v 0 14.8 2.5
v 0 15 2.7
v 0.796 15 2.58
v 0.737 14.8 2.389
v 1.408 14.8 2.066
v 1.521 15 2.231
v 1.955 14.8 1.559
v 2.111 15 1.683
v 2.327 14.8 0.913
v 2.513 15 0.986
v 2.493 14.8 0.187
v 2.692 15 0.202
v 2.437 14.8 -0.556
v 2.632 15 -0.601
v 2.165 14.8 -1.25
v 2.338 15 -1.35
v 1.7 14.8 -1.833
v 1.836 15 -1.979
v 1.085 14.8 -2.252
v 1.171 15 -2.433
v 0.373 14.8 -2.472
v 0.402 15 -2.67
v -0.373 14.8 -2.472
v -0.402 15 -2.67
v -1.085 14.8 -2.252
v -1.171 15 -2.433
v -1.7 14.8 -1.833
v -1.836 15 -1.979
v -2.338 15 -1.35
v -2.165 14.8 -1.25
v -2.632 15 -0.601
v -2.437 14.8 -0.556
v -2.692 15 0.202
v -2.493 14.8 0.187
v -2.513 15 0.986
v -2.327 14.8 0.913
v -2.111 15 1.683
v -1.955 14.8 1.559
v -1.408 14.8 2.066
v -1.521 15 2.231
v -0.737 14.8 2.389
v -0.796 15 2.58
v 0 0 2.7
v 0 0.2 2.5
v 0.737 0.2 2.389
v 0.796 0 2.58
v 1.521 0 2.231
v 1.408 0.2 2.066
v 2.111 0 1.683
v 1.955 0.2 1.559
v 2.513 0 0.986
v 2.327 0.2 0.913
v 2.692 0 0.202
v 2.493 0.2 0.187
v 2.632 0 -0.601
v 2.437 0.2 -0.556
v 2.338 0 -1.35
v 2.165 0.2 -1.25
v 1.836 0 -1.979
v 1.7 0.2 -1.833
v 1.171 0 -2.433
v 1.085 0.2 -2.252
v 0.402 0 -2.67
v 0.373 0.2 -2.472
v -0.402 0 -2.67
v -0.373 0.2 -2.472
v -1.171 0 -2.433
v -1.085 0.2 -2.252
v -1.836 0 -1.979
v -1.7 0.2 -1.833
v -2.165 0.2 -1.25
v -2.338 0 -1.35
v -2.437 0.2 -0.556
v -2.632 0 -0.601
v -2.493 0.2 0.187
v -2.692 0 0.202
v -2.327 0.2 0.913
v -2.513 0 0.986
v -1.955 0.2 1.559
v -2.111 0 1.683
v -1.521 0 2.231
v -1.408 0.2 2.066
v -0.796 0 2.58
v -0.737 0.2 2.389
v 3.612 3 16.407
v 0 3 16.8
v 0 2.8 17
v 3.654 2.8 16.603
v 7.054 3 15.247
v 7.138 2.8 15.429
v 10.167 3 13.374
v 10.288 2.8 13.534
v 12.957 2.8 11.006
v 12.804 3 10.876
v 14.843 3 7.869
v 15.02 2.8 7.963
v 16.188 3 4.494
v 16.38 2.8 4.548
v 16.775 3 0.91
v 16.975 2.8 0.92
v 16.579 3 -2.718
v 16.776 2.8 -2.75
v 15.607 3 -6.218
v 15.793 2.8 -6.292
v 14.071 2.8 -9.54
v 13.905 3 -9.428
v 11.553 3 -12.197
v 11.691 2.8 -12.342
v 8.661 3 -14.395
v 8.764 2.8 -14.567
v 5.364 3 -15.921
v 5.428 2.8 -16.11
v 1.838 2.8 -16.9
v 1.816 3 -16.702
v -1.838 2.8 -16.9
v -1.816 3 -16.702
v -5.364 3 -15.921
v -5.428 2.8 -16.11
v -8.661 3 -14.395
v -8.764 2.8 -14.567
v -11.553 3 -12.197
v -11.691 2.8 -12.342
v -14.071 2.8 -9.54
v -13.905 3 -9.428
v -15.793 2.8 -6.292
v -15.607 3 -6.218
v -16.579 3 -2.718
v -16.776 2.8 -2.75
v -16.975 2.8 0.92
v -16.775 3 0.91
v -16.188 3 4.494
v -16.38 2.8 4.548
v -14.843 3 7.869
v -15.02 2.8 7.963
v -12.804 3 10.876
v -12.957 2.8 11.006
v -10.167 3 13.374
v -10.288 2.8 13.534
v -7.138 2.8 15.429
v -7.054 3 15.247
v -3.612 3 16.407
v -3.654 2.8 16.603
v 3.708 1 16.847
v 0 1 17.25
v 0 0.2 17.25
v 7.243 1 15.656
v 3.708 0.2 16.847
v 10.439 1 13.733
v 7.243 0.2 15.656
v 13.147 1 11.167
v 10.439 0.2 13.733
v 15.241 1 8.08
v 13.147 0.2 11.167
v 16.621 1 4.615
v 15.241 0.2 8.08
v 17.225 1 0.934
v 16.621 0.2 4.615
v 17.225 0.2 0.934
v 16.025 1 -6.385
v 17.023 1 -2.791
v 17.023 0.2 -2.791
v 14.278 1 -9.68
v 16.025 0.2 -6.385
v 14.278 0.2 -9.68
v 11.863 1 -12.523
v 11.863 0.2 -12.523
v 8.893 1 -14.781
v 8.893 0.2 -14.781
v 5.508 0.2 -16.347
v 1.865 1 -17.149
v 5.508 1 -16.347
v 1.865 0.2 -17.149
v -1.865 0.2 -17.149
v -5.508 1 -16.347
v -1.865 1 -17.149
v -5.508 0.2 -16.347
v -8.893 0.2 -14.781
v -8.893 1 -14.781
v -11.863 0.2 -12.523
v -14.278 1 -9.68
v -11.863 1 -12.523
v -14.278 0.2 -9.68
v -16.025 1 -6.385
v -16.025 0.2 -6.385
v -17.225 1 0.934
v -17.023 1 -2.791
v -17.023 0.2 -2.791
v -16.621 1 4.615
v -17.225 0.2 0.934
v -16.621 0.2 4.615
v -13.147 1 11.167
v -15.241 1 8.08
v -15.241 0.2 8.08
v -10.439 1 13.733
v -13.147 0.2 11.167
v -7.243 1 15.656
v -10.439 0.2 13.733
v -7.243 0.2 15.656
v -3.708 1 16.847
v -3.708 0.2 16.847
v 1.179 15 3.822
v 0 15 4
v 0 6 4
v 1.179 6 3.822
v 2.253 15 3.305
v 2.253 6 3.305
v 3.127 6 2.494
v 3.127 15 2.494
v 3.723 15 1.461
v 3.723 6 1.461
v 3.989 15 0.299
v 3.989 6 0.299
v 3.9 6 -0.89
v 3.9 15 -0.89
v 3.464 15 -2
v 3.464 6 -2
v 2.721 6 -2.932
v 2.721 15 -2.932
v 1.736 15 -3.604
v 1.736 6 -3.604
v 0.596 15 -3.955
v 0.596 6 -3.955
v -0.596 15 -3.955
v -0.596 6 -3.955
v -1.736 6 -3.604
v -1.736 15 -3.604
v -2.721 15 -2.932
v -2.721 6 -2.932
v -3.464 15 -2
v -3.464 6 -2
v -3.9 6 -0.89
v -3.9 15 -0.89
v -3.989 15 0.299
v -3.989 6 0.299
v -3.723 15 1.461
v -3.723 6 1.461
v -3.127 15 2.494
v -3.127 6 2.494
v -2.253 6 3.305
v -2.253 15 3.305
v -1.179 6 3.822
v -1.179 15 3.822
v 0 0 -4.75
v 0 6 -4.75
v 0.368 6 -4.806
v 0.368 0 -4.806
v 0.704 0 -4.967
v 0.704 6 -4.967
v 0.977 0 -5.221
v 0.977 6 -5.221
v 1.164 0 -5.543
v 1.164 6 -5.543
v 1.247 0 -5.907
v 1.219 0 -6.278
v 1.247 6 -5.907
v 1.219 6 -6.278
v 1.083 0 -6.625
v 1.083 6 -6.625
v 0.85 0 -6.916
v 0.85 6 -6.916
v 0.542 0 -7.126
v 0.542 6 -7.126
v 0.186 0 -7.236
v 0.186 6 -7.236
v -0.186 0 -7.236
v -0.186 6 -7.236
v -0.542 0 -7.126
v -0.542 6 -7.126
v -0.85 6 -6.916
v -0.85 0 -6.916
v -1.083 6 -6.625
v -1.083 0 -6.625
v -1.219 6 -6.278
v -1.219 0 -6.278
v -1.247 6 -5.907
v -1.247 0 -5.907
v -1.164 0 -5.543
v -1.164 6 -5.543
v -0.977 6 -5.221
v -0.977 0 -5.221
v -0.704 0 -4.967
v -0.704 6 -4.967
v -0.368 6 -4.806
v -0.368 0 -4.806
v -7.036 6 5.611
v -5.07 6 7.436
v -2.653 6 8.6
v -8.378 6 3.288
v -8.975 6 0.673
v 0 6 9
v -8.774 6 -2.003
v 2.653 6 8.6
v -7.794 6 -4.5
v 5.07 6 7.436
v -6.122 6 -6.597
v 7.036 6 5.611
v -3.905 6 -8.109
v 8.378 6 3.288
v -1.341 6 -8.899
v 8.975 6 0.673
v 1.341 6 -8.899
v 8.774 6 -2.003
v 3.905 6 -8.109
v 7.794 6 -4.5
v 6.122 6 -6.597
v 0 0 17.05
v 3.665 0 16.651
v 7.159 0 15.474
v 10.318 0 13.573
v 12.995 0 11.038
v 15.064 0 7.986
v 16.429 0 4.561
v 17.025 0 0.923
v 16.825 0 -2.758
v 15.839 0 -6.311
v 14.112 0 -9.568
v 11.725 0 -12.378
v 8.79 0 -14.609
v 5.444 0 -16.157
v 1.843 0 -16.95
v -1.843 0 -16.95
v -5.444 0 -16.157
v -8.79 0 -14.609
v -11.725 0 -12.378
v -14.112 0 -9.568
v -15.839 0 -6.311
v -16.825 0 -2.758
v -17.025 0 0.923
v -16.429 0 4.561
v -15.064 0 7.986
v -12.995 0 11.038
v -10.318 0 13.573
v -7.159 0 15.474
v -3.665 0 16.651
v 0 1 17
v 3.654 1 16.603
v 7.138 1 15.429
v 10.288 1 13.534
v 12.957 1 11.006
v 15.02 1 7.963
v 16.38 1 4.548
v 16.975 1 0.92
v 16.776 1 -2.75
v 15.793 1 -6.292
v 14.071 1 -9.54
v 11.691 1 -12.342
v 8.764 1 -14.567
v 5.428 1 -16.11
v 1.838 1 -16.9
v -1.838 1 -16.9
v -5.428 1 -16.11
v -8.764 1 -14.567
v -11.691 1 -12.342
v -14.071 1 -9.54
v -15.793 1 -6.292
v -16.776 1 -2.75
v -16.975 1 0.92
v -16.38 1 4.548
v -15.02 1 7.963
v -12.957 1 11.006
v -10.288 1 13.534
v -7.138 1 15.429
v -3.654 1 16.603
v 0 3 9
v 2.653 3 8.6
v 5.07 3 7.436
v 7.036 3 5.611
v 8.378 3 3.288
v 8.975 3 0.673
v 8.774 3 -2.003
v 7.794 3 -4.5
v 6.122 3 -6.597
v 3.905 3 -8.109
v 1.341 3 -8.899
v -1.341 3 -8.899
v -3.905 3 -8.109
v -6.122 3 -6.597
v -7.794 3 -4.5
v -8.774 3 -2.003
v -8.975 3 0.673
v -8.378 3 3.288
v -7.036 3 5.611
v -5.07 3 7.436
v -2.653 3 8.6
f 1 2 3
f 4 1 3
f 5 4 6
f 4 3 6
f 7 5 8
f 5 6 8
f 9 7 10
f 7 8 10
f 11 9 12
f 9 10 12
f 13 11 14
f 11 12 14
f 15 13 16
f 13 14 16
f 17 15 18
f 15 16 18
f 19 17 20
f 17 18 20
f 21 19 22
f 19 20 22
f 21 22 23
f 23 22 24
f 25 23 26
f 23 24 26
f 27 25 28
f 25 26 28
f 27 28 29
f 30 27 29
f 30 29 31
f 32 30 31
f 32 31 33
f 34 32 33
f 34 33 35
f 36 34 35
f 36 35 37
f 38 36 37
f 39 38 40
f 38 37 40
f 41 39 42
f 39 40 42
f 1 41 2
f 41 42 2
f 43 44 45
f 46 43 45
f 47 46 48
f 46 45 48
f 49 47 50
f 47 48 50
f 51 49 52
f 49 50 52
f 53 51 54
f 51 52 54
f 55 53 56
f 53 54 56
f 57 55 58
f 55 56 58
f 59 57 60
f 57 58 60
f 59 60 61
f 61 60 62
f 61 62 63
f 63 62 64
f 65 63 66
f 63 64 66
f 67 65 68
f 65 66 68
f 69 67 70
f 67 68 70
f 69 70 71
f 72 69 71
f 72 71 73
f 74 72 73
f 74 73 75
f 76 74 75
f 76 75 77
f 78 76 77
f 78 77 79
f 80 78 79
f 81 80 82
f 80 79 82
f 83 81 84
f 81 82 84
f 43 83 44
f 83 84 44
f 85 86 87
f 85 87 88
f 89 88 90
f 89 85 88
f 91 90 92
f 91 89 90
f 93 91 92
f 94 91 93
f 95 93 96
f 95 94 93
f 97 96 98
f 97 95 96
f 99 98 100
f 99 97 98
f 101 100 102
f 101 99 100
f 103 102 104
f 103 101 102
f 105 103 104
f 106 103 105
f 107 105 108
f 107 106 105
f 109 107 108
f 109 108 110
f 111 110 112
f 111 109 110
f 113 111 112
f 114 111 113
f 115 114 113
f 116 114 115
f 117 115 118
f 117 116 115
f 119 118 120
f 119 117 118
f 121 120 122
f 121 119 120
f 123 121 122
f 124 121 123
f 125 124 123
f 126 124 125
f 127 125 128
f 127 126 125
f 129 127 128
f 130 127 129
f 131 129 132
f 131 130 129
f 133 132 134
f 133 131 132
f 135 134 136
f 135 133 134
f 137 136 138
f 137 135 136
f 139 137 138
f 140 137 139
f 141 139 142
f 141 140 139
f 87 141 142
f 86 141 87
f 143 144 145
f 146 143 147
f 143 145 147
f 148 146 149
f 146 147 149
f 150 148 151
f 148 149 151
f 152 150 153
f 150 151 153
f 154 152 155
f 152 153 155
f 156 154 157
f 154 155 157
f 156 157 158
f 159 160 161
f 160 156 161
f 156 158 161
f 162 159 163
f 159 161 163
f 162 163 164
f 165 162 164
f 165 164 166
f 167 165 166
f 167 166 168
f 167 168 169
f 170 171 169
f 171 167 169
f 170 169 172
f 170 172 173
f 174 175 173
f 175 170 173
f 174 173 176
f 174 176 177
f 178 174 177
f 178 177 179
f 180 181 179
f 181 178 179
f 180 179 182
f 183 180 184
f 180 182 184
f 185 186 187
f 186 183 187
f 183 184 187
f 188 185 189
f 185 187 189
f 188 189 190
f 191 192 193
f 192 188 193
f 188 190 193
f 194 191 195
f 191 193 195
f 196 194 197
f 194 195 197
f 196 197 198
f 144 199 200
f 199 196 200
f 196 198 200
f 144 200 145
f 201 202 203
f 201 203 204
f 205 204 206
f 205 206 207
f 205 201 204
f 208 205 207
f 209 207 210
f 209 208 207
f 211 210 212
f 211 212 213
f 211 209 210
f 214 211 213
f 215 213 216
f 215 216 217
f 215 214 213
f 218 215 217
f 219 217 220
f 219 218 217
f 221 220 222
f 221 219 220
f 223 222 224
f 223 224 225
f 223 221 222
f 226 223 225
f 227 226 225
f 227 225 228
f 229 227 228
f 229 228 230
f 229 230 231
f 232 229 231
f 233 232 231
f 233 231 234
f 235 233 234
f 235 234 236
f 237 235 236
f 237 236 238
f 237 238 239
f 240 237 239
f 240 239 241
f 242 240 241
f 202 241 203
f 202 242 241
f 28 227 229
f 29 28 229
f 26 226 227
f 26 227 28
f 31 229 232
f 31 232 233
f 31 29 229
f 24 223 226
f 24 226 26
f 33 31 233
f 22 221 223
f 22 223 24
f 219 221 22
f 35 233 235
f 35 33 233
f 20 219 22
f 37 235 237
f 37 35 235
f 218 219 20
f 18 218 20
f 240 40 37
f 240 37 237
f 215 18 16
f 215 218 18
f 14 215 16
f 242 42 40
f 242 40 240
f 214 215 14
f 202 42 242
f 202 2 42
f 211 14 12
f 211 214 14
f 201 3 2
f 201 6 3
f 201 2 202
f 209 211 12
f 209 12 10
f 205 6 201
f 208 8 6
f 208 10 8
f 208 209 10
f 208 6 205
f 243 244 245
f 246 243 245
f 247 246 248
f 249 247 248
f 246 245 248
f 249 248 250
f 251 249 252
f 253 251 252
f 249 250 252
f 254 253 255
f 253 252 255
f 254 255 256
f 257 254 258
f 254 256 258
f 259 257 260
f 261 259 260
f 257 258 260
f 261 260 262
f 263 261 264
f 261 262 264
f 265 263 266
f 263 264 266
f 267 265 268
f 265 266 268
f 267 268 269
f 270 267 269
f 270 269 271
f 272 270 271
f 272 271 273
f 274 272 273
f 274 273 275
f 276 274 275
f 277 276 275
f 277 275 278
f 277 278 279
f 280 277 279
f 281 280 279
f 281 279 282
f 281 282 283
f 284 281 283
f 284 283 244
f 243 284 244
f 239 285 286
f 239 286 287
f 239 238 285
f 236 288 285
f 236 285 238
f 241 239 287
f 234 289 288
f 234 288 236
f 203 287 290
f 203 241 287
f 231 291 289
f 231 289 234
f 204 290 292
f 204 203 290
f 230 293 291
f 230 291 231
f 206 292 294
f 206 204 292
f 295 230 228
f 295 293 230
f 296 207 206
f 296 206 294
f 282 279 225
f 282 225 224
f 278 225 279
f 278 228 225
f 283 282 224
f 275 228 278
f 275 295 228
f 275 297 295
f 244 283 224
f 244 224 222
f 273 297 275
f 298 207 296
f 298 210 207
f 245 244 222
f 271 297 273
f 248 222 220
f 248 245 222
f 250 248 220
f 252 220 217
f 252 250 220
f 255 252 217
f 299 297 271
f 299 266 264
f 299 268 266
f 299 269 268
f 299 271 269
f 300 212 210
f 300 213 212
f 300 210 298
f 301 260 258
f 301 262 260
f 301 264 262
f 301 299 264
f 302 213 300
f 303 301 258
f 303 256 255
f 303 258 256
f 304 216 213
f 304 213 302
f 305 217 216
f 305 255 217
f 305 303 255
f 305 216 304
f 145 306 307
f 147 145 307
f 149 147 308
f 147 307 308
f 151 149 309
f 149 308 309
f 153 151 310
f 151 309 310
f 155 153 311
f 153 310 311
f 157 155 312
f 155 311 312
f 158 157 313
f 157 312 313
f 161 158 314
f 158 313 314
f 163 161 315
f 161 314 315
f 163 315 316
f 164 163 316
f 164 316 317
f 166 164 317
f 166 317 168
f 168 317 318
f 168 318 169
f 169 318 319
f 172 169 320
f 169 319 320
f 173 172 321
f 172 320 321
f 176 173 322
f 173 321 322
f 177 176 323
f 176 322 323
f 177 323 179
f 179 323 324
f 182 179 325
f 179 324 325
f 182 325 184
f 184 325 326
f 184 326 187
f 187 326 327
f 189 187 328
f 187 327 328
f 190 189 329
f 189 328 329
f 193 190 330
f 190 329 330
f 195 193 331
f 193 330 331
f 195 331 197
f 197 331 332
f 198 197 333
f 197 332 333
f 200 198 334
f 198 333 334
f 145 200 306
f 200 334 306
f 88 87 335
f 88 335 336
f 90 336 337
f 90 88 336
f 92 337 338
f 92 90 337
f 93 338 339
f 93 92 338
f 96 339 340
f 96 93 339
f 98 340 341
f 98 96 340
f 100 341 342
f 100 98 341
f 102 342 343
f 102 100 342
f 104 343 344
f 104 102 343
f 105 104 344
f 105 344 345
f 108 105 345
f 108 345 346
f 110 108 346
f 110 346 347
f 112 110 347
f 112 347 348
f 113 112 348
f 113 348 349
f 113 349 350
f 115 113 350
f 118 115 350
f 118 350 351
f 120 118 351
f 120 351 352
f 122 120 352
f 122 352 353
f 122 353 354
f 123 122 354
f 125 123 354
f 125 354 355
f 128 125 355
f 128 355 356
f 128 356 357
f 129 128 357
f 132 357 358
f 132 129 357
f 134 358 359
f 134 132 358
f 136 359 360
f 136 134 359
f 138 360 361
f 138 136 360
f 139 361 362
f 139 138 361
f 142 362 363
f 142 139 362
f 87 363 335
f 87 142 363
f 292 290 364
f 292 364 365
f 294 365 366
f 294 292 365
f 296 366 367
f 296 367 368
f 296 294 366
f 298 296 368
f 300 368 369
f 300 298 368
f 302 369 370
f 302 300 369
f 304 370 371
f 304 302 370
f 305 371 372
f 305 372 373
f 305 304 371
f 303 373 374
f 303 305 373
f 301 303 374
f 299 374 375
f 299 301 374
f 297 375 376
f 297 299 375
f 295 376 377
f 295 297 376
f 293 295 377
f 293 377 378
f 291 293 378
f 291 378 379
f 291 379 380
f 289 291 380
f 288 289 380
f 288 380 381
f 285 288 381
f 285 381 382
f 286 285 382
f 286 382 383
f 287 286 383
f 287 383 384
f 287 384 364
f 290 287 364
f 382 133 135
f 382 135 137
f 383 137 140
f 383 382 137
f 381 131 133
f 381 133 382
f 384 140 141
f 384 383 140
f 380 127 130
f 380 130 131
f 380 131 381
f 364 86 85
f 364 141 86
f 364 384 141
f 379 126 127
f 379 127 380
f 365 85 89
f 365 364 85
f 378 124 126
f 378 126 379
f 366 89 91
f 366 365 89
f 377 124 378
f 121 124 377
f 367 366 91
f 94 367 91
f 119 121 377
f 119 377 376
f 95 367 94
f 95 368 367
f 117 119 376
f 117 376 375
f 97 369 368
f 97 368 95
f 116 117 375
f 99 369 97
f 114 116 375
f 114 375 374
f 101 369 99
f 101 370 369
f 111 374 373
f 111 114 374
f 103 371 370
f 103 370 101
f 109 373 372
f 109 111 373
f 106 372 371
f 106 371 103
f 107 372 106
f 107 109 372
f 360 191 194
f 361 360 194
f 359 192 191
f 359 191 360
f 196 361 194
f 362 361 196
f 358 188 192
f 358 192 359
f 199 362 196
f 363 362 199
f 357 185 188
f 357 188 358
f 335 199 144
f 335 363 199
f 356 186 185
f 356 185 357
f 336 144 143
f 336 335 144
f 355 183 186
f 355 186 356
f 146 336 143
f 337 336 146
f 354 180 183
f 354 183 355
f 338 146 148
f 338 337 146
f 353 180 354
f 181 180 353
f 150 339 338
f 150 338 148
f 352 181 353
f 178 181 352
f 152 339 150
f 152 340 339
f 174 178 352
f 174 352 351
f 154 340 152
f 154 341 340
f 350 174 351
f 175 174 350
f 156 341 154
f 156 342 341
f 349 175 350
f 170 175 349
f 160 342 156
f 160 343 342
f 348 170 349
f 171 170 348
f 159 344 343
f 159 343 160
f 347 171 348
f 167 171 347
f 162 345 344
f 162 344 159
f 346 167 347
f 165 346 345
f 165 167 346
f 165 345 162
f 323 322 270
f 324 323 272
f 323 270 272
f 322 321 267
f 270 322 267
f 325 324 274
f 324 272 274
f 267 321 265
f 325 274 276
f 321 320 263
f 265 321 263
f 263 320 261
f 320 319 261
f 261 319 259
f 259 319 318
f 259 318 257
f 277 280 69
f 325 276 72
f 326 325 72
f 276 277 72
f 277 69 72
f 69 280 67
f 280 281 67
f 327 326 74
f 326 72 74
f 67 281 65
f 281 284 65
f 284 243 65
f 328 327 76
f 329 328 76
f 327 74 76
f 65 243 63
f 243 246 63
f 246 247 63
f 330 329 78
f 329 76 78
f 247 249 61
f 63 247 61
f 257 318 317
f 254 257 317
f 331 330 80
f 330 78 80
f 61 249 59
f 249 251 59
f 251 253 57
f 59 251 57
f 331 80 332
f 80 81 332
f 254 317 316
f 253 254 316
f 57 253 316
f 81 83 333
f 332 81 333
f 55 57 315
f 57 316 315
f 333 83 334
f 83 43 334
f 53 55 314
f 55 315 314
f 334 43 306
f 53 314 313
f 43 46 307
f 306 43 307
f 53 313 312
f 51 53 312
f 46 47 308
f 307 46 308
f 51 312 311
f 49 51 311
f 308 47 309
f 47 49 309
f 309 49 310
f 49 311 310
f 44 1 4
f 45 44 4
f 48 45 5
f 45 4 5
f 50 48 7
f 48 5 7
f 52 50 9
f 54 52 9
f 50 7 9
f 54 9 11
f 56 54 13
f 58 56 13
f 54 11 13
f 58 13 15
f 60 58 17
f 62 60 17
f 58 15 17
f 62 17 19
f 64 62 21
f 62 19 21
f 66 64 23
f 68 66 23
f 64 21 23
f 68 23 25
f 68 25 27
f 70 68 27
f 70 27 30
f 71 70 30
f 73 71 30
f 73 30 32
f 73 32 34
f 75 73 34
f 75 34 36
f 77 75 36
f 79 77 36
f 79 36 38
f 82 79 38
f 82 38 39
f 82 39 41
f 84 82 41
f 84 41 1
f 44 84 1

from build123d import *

# Parameters (mm, degrees)
SKETCH1_R           = 17.25
BOSS_EXTRUDE1_DEPTH = 15
SKETCH2_OUTSIDE_W   = 46.708
SKETCH2_OUTSIDE_H   = 46.708
SKETCH2_OUTSIDE_R   = 17
CUT_EXTRUDE1_DEPTH  = 14
SKETCH3_OUTSIDE_W   = 46.708
SKETCH3_OUTSIDE_H   = 46.708
SKETCH3_OUTSIDE_R   = 9
CUT_EXTRUDE4_DEPTH  = 12
SKETCH6_OUTSIDE_W   = 46.708
SKETCH6_OUTSIDE_H   = 46.708
SKETCH6_OUTSIDE_R   = 4
CUT_EXTRUDE5_DEPTH  = 9
SKETCH7_R           = 2.5
CUT_EXTRUDE6_DEPTH  = 29.637824638
SKETCH8_R           = 1.25
CUT_EXTRUDE7_DEPTH  = 27.002403735
CHAMFER1_SIZE       = 0.2


with BuildPart() as part:
    # Sketch1 → Boss-Extrude1 (new body)
    with BuildSketch(Plane(origin=(0, 0, 0), x_dir=(1, 0, 0), z_dir=(0, 1, 0))):
        with Locations(Location((0, 0, 0), (0, 0, 270))):
            Circle(SKETCH1_R)
    extrude(amount=BOSS_EXTRUDE1_DEPTH)

    # Sketch2 outside → Cut-Extrude1 (cut)
    with BuildSketch(Plane(origin=(0, 15, 0), x_dir=(1, 0, 0), z_dir=(0, 1, 0))):
        Rectangle(SKETCH2_OUTSIDE_W, SKETCH2_OUTSIDE_H)
        with Locations(Location((0, 0, 0), (0, 0, 270))):
            Circle(SKETCH2_OUTSIDE_R, mode=Mode.SUBTRACT)
    extrude(amount=-CUT_EXTRUDE1_DEPTH, mode=Mode.SUBTRACT)

    # Sketch3 outside → Cut-Extrude4 (cut)
    with BuildSketch(Plane(origin=(0, 15, 0), x_dir=(1, 0, 0), z_dir=(0, 1, 0))):
        Rectangle(SKETCH3_OUTSIDE_W, SKETCH3_OUTSIDE_H)
        with Locations(Location((0, 0, 0), (0, 0, 270))):
            Circle(SKETCH3_OUTSIDE_R, mode=Mode.SUBTRACT)
    extrude(amount=-CUT_EXTRUDE4_DEPTH, mode=Mode.SUBTRACT)

    # Sketch6 outside → Cut-Extrude5 (cut)
    with BuildSketch(Plane(origin=(0, 15, 0), x_dir=(1, 0, 0), z_dir=(0, 1, 0))):
        Rectangle(SKETCH6_OUTSIDE_W, SKETCH6_OUTSIDE_H)
        with Locations(Location((0, 0, 0), (0, 0, 270))):
            Circle(SKETCH6_OUTSIDE_R, mode=Mode.SUBTRACT)
    extrude(amount=-CUT_EXTRUDE5_DEPTH, mode=Mode.SUBTRACT)

    # Sketch7 → Cut-Extrude6 (cut, through all)
    with BuildSketch(Plane(origin=(0, 15, 0), x_dir=(1, 0, 0), z_dir=(0, 1, 0))):
        with Locations(Location((0, 0, 0), (0, 0, 270))):
            Circle(SKETCH7_R)
    extrude(amount=-CUT_EXTRUDE6_DEPTH, mode=Mode.SUBTRACT)

    # Sketch8 → Cut-Extrude7 (cut, through all)
    with BuildSketch(Plane(origin=(0, 6, 0), x_dir=(1, 0, 0), z_dir=(0, 1, 0))):
        with Locations(Location((0, 6, 0), (0, 0, 270))):
            Circle(SKETCH8_R)
    extrude(amount=-CUT_EXTRUDE7_DEPTH, mode=Mode.SUBTRACT)

    # Chamfer1
    chamfer1_edges = [part.edges().sort_by_distance(p)[0] for p in [
        (0, 0, -17.25),
        (0, 3, -17),
        (0, 0, -2.5),
        (0, 15, -2.5),
    ]]
    chamfer(chamfer1_edges, length=CHAMFER1_SIZE)


solid = part.part
